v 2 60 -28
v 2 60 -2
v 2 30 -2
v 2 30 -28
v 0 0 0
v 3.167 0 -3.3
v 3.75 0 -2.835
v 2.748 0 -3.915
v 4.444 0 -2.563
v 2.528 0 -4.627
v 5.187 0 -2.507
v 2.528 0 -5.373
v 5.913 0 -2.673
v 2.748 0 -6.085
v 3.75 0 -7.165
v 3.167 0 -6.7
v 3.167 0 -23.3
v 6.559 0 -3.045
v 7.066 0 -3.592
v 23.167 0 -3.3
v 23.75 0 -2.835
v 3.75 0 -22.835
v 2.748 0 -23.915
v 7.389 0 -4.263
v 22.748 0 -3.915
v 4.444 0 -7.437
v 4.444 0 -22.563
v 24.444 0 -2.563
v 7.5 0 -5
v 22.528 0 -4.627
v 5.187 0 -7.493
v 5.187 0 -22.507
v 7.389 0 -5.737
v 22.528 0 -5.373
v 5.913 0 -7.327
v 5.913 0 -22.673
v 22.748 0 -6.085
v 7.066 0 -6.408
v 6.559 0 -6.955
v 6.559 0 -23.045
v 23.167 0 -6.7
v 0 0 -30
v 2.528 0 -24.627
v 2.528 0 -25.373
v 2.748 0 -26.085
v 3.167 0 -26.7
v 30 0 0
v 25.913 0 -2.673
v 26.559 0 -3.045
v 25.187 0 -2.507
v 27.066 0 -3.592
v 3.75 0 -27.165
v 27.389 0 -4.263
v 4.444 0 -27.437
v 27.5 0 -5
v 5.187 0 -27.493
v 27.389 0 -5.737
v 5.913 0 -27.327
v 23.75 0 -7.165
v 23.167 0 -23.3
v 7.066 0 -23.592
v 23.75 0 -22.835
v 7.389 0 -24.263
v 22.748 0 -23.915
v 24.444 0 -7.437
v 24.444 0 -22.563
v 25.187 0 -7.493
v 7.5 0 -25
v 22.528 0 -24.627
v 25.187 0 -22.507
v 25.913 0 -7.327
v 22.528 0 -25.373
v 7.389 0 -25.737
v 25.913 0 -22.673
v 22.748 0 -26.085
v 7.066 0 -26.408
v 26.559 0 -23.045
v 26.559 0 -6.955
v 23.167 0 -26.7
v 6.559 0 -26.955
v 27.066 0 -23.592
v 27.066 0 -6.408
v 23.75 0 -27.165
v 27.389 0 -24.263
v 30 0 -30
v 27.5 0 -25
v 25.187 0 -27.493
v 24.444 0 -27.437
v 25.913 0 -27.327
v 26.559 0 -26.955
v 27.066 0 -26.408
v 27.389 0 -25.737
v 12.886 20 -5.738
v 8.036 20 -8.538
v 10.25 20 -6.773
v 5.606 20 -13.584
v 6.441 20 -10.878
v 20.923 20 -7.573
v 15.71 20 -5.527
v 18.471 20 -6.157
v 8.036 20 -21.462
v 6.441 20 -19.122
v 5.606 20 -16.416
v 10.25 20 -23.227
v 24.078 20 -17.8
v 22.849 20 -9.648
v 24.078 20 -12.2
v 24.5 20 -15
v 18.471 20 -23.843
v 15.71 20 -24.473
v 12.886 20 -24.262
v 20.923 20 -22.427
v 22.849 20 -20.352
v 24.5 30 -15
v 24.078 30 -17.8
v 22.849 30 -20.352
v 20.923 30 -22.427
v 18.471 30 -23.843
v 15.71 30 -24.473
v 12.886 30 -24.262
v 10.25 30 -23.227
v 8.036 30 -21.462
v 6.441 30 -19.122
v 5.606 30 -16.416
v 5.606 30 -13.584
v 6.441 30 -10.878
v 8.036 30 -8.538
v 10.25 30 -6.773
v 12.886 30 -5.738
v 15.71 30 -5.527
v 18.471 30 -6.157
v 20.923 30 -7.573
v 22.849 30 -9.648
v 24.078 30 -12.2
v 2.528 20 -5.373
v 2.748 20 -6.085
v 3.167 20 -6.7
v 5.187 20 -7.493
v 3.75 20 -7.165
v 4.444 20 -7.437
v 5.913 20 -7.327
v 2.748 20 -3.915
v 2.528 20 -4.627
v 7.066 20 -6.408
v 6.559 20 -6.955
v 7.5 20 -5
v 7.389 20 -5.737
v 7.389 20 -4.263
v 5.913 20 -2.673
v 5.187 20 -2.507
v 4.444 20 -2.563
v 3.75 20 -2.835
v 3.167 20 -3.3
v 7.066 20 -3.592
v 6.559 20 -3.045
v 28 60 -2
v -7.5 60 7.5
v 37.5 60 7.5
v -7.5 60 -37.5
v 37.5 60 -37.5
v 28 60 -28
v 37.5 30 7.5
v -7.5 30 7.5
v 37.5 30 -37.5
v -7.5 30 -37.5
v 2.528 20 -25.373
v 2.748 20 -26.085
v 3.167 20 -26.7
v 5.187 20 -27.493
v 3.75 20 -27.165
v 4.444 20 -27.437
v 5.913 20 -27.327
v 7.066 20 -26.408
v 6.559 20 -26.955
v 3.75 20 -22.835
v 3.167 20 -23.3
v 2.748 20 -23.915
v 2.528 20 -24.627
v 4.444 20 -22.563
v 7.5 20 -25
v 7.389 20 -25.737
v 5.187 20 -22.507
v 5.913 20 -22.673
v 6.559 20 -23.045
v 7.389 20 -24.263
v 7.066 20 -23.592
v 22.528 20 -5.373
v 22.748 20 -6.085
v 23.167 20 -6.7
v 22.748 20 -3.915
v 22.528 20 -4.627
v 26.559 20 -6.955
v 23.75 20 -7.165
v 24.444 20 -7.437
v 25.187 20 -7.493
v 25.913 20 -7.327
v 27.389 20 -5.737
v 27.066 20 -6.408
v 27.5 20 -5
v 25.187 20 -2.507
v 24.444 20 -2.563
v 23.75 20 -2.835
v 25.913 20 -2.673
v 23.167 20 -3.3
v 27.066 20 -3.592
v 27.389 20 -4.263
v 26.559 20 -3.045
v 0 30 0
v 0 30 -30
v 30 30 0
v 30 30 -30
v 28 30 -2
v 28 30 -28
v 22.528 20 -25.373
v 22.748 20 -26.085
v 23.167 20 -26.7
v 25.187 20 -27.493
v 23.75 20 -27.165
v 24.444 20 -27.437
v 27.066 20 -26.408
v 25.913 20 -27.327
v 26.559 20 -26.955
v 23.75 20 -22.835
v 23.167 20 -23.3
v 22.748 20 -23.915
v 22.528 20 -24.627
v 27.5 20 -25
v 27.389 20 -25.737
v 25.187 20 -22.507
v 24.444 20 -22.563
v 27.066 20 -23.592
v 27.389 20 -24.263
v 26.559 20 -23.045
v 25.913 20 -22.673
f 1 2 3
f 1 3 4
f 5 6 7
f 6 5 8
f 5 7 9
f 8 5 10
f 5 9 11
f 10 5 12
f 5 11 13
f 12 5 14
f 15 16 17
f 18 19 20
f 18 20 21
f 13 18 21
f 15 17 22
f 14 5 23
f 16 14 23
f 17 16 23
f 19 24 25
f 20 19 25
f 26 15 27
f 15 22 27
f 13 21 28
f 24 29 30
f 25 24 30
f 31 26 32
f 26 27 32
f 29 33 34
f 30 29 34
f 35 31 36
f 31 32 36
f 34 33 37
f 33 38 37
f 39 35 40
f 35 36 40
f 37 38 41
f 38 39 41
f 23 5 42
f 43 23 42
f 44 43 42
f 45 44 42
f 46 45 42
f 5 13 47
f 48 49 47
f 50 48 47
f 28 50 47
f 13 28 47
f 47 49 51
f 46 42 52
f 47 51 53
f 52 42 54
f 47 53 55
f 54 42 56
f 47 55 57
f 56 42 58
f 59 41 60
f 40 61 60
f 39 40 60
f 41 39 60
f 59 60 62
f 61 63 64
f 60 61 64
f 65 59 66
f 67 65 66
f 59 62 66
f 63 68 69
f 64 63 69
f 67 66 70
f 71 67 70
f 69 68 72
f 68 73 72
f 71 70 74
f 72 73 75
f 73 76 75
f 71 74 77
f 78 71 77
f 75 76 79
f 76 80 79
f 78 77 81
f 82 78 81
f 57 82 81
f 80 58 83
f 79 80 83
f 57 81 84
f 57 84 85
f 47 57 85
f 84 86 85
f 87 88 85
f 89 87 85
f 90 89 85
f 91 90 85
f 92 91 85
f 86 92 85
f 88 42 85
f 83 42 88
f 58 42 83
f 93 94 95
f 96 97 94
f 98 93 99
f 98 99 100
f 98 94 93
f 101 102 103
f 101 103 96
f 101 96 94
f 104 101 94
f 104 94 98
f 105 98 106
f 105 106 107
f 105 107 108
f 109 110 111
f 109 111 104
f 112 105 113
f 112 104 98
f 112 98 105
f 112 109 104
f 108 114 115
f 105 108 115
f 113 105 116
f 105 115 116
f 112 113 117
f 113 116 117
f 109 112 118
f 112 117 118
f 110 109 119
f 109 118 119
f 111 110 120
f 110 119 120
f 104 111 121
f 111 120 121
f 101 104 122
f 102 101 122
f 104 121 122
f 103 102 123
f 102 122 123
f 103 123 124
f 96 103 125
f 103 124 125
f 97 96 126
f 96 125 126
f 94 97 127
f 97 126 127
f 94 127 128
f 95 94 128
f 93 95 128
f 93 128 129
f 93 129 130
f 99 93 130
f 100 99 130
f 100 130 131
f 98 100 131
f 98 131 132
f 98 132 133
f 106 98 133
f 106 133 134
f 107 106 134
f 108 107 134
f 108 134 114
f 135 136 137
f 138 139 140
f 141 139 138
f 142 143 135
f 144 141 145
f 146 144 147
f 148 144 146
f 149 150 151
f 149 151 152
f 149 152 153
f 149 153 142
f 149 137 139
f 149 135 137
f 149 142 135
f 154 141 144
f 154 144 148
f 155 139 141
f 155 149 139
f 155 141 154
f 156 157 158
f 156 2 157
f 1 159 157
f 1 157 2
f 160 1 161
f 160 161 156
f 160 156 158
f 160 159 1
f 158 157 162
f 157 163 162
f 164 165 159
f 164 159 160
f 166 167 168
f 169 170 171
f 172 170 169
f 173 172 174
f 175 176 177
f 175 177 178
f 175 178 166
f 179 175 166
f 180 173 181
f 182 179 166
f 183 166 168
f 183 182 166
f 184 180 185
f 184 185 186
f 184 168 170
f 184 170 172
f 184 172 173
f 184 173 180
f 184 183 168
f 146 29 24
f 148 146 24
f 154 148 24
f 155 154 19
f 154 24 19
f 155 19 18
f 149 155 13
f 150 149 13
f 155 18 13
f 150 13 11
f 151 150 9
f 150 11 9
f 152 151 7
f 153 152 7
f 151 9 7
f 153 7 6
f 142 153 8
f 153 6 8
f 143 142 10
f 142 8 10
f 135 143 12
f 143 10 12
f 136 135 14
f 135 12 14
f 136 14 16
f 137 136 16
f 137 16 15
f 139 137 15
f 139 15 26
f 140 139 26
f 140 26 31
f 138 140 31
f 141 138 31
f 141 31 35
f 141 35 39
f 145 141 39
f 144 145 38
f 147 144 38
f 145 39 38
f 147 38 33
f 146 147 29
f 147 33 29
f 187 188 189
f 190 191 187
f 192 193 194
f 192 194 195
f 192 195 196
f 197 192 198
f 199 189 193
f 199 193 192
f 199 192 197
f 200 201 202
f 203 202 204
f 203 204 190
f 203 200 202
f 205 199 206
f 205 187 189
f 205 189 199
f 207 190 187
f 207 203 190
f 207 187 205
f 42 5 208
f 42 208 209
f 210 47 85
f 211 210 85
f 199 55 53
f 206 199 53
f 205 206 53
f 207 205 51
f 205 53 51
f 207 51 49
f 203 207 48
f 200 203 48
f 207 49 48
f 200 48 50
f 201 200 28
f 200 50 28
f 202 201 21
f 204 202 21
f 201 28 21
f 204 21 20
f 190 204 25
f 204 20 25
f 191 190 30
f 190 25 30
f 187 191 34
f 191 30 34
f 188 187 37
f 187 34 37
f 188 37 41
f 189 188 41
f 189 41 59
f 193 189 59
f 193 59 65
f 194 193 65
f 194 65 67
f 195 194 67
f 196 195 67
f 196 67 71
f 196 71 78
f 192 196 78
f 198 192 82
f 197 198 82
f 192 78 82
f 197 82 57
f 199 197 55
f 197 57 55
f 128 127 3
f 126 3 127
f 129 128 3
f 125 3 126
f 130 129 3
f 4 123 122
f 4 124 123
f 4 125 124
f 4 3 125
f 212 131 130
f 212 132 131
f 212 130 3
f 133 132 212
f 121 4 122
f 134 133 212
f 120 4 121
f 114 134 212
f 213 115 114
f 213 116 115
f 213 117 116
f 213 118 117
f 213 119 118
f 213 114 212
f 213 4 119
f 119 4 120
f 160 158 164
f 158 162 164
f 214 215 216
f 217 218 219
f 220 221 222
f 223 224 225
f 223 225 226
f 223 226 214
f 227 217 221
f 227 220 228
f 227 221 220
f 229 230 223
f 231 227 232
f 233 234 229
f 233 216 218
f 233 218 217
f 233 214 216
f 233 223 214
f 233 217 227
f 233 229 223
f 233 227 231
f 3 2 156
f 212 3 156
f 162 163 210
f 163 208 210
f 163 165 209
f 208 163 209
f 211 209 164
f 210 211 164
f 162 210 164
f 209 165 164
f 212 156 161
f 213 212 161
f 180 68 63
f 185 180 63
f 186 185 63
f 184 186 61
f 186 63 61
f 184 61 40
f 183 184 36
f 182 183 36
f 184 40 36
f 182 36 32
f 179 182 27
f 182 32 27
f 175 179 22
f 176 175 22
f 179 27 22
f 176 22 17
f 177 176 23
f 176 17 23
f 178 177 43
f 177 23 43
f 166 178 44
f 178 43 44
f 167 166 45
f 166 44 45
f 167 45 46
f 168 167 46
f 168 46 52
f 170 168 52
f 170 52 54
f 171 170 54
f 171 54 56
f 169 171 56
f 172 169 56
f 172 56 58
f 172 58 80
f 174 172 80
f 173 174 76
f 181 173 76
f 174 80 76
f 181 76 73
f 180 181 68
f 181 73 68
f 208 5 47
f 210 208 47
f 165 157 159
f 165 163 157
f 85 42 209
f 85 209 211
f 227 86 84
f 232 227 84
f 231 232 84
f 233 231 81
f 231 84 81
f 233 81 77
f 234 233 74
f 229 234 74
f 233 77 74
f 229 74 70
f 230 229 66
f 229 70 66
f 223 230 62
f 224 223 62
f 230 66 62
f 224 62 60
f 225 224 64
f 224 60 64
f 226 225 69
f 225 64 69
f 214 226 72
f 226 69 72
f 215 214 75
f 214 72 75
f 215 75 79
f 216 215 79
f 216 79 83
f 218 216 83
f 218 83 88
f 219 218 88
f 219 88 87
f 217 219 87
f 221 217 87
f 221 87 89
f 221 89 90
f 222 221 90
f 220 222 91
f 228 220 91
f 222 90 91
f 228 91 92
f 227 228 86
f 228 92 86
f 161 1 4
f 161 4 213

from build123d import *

# Parameters (mm, degrees)
SKETCH1_W           = 30
SKETCH1_H           = 30
BOSS_EXTRUDE1_DEPTH = 30
SKETCH2_W           = 45
SKETCH2_H           = 45
BOSS_EXTRUDE2_DEPTH = 10
SKETCH4_W           = 45
SKETCH4_H           = 45
BOSS_EXTRUDE3_DEPTH = 20
SKETCH5_R           = 9.5
CUT_EXTRUDE1_DEPTH  = 40
SKETCH6_W           = 26
SKETCH6_H           = 26
CUT_EXTRUDE2_DEPTH  = 30
SKETCH7_R           = 2.5
CUT_EXTRUDE3_DEPTH  = 20


with BuildPart() as part:
    # Sketch1 → Boss-Extrude1 (new body)
    with BuildSketch(Plane(origin=(0, 0, 0), x_dir=(1, 0, 0), z_dir=(0, 1, 0))):
        with Locations((15, 15)):
            Rectangle(SKETCH1_W, SKETCH1_H)
    extrude(amount=BOSS_EXTRUDE1_DEPTH)

    # Sketch2 → Boss-Extrude2 (add)
    with BuildSketch(Plane(origin=(0, 30, 0), x_dir=(1, 0, 0), z_dir=(0, 1, 0))):
        with Locations((15, 15)):
            Rectangle(SKETCH2_W, SKETCH2_H)
    extrude(amount=BOSS_EXTRUDE2_DEPTH)

    # Sketch4 → Boss-Extrude3 (add)
    with BuildSketch(Plane(origin=(0, 40, 0), x_dir=(1, 0, 0), z_dir=(0, 1, 0))):
        with Locations((15, 15)):
            Rectangle(SKETCH4_W, SKETCH4_H)
    extrude(amount=BOSS_EXTRUDE3_DEPTH)

    # Sketch5 → Cut-Extrude1 (cut)
    with BuildSketch(Plane(origin=(0, 60, 0), x_dir=(1, 0, 0), z_dir=(0, 1, 0))):
        with Locations((15, 15)):
            Circle(SKETCH5_R)
    extrude(amount=-CUT_EXTRUDE1_DEPTH, mode=Mode.SUBTRACT)

    # Sketch6 → Cut-Extrude2 (cut)
    with BuildSketch(Plane(origin=(0, 60, 0), x_dir=(1, 0, 0), z_dir=(0, 1, 0))):
        with Locations((15, 15)):
            Rectangle(SKETCH6_W, SKETCH6_H)
    extrude(amount=-CUT_EXTRUDE2_DEPTH, mode=Mode.SUBTRACT)

    # Sketch7 → Cut-Extrude3 (cut)
    with BuildSketch(Plane.XZ):
        with Locations((25, -25)):
            Circle(SKETCH7_R)
        with Locations((5, -25)):
            Circle(SKETCH7_R)
        with Locations((5, -5)):
            Circle(SKETCH7_R)
        with Locations((25, -5)):
            Circle(SKETCH7_R)
    extrude(amount=-CUT_EXTRUDE3_DEPTH, mode=Mode.SUBTRACT)


solid = part.part
